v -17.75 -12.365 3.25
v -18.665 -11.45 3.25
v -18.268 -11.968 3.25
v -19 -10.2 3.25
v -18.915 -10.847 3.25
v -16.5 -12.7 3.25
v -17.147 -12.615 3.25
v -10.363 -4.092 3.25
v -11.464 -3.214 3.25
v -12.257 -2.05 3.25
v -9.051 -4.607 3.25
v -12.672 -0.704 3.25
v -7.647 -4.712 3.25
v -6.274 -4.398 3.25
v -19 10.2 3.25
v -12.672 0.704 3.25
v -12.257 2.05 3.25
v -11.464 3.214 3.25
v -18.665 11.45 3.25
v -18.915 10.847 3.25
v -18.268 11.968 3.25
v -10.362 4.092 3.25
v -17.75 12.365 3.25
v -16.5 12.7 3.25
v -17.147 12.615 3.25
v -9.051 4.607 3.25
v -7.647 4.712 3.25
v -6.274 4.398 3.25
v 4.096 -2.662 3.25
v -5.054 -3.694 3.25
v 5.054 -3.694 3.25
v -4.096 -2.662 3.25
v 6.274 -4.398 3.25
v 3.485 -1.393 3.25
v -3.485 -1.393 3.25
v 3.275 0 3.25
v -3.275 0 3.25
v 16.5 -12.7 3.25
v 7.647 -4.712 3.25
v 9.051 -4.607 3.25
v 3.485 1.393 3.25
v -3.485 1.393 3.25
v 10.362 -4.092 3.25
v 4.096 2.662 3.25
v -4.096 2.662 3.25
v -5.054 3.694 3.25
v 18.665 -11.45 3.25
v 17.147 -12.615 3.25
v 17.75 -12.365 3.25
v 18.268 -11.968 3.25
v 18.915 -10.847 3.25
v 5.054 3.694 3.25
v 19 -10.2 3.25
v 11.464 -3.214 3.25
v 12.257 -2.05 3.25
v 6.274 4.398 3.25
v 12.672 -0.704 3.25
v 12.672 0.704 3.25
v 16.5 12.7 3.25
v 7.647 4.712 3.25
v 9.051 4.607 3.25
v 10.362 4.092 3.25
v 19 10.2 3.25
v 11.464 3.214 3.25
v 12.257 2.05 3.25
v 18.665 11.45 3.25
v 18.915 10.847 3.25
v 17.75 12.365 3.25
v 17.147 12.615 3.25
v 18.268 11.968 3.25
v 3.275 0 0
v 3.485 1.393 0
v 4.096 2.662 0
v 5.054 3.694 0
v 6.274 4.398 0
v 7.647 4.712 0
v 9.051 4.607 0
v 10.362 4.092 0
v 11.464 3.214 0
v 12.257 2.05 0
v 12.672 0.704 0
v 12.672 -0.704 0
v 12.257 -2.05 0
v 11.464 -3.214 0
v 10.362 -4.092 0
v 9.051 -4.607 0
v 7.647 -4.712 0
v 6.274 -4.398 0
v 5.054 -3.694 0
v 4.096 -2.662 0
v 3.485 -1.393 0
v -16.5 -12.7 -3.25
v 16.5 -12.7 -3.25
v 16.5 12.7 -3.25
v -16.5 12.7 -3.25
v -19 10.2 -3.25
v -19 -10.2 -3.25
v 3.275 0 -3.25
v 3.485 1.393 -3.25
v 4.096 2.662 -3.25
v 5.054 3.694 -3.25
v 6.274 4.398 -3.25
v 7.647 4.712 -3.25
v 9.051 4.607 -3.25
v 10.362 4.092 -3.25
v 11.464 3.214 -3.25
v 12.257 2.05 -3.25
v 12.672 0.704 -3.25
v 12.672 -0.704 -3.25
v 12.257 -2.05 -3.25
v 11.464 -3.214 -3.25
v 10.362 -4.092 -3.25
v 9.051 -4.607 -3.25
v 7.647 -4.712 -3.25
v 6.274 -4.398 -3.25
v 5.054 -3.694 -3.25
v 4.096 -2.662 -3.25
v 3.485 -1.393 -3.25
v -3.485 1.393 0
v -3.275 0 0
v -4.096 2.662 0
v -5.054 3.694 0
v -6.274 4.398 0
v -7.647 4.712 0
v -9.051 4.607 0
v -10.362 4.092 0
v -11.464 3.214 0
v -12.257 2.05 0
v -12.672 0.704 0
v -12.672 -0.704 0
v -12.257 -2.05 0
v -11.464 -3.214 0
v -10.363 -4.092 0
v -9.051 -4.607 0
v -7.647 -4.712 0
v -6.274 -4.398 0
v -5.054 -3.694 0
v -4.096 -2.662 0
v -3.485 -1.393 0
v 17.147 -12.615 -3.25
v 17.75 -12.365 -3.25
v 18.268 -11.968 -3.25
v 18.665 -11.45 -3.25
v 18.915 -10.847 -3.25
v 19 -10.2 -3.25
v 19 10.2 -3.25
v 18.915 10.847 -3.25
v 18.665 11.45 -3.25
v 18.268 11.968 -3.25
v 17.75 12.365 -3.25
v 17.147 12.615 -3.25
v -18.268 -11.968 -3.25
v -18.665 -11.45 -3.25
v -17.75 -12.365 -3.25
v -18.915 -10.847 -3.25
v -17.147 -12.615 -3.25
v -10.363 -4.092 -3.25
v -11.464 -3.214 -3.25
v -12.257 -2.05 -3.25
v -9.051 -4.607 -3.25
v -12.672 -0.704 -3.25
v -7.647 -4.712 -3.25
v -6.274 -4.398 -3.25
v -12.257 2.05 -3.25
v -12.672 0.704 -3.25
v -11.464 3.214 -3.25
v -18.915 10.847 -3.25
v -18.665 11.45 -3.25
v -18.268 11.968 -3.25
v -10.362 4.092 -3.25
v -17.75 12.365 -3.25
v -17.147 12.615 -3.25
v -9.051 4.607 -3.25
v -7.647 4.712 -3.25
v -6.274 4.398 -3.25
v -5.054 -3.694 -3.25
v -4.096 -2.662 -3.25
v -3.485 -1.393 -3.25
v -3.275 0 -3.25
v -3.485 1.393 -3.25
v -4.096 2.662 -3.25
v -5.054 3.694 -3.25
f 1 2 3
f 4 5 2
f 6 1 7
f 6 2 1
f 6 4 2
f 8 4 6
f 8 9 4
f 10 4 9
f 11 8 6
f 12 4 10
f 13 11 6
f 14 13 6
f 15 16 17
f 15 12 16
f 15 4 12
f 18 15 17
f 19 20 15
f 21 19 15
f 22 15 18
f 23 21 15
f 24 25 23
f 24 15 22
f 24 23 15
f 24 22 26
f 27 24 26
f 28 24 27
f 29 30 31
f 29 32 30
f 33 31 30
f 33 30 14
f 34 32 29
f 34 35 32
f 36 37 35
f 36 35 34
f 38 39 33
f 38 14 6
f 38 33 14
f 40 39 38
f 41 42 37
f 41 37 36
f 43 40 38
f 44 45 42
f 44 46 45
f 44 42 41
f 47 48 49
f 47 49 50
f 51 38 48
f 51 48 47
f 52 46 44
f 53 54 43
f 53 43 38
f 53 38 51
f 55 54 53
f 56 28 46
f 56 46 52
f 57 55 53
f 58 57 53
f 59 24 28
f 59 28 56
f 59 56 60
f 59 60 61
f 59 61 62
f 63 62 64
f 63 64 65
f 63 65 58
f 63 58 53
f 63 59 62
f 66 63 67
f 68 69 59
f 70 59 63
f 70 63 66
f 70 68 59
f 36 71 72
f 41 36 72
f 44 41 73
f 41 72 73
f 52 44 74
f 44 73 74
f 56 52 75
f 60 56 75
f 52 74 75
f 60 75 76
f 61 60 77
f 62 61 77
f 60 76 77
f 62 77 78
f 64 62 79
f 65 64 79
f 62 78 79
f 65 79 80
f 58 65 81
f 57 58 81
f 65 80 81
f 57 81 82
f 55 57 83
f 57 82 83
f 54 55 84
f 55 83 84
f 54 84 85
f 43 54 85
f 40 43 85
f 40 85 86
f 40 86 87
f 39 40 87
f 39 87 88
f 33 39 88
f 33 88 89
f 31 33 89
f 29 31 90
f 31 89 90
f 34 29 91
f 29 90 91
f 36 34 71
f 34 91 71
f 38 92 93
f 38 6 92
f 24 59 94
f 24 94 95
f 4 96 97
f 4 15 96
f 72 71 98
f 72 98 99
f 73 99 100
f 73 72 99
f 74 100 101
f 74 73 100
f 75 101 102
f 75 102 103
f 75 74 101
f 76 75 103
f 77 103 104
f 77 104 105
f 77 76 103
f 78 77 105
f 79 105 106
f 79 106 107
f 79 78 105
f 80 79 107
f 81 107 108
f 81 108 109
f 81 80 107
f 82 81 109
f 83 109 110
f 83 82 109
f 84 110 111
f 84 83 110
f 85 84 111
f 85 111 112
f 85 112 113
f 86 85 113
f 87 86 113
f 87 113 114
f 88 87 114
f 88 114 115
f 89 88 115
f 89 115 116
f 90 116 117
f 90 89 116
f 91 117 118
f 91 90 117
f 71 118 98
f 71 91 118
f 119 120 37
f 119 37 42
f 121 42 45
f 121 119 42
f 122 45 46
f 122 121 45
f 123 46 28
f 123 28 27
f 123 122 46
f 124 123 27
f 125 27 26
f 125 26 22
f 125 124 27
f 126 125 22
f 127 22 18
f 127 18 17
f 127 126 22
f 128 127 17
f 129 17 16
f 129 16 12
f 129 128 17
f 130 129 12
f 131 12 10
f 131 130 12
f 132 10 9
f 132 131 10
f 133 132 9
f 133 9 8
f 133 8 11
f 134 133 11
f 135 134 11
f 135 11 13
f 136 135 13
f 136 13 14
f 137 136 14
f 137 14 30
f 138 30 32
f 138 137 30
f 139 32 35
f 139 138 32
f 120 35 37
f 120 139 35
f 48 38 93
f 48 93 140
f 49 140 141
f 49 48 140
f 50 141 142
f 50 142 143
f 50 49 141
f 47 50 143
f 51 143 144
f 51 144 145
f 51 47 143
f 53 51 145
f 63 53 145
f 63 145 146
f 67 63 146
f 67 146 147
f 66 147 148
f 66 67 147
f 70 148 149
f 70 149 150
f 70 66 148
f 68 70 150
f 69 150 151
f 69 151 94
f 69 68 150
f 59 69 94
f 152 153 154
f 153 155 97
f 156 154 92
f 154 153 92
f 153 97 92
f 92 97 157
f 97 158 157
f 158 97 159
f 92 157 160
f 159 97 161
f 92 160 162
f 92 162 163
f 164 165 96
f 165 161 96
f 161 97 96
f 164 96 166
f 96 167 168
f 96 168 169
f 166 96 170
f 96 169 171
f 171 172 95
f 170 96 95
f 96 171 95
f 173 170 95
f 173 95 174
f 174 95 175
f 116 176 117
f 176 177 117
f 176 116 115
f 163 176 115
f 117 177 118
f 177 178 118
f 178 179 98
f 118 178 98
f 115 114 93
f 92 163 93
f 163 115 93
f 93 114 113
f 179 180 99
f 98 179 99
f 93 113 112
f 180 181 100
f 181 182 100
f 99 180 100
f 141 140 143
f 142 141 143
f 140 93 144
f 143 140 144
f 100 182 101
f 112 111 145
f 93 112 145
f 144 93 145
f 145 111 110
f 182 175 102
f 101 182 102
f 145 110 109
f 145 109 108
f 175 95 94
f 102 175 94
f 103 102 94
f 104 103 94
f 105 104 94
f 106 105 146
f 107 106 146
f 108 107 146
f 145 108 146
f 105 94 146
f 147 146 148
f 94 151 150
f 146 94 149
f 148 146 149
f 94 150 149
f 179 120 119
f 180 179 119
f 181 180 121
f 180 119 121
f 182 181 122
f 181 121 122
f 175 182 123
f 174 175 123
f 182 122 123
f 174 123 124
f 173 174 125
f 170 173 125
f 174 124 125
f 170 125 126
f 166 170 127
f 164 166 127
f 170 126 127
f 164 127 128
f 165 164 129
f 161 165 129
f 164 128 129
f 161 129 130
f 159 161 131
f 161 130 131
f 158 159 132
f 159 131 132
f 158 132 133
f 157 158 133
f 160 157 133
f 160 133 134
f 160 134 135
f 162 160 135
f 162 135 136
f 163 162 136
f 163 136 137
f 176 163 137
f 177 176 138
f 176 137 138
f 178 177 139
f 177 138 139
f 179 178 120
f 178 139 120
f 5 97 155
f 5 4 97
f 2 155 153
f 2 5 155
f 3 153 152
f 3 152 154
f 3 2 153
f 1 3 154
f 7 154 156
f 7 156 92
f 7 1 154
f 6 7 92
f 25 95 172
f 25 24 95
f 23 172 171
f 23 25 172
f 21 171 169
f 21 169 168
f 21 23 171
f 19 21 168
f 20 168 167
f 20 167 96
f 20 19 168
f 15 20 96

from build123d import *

# Parameters (mm, degrees)
F0_R     = 4.725
F1_DEPTH = 3.25


with BuildPart() as f1:
    # F0 (on Top) → F1 (new body, symmetric)
    with BuildSketch(Plane.XY):
        with BuildLine():
            Line((-16.5, -12.7), (16.5, -12.7))
            ThreePointArc((16.5, -12.7), (18.267767, -11.967767), (19, -10.2))
            Line((19, -10.2), (19, 10.2))
            ThreePointArc((19, 10.2), (18.267767, 11.967767), (16.5, 12.7))
            Line((16.5, 12.7), (-16.5, 12.7))
            ThreePointArc((-16.5, 12.7), (-18.267767, 11.967767), (-19, 10.2))
            Line((-19, 10.2), (-19, -10.2))
            ThreePointArc((-19, -10.2), (-18.267767, -11.967767), (-16.5, -12.7))
        make_face()
        with Locations((-8, 0)):
            Circle(F0_R, mode=Mode.SUBTRACT)
        with BuildLine():
            ThreePointArc((12.725, 0), (8, -4.725), (3.275, 0))
            ThreePointArc((3.275, 0), (8, 4.725), (12.725, 0))
        make_face(mode=Mode.SUBTRACT)
    extrude(amount=F1_DEPTH, both=True)


solid = f1.part
